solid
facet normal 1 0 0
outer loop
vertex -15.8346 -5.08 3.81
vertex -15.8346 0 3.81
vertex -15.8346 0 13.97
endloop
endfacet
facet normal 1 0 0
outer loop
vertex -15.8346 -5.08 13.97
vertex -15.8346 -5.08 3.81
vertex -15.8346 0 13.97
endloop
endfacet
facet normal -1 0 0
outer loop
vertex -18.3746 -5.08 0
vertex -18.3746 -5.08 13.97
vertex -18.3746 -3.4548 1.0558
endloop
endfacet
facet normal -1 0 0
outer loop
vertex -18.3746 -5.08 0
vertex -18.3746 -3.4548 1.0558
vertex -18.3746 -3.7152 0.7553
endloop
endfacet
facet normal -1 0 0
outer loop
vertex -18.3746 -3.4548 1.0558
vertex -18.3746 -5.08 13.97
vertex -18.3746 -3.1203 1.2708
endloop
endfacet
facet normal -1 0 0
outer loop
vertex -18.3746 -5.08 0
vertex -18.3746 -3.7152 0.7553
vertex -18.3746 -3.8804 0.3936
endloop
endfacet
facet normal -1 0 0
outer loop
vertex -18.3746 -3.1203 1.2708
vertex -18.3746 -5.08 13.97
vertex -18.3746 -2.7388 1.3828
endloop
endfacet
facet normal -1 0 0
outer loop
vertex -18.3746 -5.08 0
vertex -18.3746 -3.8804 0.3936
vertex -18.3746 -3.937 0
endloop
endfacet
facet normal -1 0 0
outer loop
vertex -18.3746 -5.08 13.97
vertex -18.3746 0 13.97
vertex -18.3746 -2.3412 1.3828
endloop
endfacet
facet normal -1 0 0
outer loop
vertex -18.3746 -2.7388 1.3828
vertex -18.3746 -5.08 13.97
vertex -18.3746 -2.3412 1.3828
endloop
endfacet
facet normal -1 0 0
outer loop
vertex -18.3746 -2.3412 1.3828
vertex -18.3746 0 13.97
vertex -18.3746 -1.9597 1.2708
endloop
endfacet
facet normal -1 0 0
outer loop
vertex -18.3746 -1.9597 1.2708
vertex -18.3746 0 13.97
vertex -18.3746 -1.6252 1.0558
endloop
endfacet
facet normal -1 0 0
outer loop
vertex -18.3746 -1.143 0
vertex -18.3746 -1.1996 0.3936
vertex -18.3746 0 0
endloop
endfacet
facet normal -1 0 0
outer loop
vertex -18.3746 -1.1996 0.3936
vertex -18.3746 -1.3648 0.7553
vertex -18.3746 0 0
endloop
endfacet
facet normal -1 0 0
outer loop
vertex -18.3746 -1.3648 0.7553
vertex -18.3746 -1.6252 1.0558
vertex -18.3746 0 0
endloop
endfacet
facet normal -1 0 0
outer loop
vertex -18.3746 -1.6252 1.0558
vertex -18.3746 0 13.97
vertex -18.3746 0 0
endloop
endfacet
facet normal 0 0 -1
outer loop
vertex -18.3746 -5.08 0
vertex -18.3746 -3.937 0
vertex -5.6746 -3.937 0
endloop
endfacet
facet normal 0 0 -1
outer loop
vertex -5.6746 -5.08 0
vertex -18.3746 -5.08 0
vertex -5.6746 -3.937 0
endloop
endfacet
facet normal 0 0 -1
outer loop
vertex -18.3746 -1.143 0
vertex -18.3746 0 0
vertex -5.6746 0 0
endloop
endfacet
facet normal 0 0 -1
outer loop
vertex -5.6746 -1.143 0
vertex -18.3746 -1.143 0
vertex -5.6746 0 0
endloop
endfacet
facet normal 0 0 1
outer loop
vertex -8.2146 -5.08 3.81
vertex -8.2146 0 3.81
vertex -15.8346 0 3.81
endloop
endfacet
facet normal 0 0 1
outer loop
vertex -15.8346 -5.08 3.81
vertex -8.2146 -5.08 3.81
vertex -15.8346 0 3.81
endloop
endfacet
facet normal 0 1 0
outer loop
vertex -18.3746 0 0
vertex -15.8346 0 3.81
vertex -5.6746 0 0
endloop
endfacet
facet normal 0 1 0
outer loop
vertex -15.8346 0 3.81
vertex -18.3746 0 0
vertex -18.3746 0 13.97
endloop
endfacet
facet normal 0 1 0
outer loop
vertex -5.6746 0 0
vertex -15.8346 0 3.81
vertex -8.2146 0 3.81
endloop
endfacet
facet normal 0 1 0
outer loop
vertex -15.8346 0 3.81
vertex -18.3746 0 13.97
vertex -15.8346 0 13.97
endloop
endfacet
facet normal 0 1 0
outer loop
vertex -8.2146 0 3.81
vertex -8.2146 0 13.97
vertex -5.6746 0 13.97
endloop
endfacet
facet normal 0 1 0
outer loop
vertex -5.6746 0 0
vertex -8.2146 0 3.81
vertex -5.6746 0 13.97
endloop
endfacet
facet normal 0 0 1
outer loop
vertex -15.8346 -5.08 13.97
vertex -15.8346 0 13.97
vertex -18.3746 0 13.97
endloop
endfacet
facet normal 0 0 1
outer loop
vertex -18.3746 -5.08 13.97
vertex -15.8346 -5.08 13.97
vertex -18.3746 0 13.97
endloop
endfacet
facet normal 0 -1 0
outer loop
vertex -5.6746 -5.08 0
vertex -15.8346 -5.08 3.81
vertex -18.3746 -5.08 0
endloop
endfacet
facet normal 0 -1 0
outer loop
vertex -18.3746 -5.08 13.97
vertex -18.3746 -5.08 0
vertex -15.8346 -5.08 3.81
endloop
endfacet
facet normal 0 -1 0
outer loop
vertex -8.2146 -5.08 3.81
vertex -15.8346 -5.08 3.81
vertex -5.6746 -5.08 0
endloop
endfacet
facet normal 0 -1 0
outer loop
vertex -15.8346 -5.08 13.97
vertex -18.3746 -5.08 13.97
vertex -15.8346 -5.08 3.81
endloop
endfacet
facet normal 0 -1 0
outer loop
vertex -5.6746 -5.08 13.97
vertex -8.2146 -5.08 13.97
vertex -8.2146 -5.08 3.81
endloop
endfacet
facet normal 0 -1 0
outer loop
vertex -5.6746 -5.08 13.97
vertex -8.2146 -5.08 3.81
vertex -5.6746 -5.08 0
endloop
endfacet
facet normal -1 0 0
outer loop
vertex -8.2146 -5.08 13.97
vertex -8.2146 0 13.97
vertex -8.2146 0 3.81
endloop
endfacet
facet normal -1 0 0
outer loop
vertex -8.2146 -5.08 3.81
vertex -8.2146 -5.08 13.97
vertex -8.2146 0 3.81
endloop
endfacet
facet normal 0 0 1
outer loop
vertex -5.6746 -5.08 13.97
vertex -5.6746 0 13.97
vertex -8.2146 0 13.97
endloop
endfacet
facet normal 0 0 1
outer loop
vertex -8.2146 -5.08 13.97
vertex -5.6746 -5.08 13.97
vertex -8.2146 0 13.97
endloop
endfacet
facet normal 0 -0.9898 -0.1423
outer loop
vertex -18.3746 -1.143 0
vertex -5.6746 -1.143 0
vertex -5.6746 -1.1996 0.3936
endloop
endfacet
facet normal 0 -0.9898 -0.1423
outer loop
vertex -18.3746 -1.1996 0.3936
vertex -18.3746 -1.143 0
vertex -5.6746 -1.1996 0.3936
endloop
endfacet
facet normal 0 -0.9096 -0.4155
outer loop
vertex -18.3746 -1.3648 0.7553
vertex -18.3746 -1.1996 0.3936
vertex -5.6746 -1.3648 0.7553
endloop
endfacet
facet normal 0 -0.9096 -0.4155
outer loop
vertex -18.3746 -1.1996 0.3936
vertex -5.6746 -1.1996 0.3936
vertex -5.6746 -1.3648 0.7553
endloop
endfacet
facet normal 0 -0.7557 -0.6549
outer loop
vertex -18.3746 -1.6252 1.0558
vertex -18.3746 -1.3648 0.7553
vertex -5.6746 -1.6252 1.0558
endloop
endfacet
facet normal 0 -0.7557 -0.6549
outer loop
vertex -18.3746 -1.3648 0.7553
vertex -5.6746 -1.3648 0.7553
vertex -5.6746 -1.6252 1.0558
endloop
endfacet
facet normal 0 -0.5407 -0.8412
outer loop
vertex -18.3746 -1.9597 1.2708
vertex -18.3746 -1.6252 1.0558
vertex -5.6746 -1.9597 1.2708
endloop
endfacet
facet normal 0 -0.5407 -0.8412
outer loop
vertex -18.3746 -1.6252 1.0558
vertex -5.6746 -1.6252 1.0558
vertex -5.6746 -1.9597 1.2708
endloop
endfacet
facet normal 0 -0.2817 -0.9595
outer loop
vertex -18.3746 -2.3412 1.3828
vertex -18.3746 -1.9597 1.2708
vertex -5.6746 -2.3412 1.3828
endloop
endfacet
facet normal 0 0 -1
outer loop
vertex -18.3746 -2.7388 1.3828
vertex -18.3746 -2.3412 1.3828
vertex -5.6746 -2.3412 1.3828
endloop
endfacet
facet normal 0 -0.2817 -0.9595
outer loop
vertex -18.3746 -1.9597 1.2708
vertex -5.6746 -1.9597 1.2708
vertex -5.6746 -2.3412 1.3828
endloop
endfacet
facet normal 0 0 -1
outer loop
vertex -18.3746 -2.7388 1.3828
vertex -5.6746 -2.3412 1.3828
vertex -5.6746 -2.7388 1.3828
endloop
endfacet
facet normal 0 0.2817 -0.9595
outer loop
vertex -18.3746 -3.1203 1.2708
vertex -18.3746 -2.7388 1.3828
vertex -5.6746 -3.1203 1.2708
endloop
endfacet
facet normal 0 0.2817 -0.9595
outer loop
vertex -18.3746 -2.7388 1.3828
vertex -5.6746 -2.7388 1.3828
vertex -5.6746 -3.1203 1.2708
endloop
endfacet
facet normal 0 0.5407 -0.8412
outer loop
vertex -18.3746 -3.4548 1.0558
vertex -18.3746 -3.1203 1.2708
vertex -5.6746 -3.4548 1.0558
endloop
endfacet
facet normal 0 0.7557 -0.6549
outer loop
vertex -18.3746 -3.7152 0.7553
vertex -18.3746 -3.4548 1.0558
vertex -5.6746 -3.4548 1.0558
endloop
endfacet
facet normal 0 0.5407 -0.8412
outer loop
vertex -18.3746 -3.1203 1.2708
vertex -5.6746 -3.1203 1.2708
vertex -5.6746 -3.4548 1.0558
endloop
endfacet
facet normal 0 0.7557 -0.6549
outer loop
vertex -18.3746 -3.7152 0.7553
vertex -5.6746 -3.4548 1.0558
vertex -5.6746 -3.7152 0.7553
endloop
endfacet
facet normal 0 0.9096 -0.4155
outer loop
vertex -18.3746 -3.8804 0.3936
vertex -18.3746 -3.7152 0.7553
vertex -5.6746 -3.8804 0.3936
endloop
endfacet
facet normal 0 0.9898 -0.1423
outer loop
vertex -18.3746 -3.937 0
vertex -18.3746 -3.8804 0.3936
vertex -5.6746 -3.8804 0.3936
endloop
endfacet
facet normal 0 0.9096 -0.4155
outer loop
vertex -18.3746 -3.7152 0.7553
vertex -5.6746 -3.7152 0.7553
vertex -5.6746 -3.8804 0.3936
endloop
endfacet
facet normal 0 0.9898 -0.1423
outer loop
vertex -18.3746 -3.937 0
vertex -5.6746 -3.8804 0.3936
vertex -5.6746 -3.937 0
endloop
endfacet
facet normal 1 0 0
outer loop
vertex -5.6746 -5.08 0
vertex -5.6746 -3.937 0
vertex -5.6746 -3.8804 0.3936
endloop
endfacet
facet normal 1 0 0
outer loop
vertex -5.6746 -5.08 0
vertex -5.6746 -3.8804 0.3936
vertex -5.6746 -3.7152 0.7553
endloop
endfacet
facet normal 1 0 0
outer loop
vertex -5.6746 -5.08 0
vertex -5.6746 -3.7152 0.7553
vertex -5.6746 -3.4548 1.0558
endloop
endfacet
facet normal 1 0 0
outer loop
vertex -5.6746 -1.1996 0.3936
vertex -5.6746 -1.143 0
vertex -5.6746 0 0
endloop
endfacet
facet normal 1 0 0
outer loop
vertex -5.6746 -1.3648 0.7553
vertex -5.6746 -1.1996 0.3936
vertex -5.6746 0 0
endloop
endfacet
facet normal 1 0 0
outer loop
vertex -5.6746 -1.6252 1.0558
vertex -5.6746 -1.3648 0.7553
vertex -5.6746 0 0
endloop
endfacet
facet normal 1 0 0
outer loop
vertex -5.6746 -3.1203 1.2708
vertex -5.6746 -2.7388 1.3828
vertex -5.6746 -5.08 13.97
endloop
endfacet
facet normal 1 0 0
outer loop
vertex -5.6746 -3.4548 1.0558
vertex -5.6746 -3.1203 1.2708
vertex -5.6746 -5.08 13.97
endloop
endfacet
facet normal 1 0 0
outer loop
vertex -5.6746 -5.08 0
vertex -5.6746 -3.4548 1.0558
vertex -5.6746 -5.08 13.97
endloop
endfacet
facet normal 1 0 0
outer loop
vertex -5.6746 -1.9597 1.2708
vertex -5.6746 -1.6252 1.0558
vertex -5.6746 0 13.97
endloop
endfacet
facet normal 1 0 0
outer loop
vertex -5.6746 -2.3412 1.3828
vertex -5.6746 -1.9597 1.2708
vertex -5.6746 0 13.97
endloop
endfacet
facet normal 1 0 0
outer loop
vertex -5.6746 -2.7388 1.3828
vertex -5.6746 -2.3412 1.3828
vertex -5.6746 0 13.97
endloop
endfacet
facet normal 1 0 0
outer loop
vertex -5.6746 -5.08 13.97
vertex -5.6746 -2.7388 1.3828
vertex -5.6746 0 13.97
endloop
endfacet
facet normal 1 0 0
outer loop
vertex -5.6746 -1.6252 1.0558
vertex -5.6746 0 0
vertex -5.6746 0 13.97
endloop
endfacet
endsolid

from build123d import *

# Parameters (mm, degrees)
F1_DEPTH = 5.08
F2_R     = 1.397
F3_DEPTH = 25.4


with BuildPart() as f1:
    # F0 (on Front) → F1 (new body)
    with BuildSketch(Plane.XZ):
        Polygon((-15.834635, 13.97), (-18.374635, 13.97), (-18.374635, 0), (-12.024635, 0), (-12.024635, 3.81), (-15.834635, 3.81), align=None)
        Polygon((-12.024635, 3.81), (-12.024635, 0), (-5.674635, 0), (-5.674635, 13.97), (-8.214635, 13.97), (-8.214635, 3.81), align=None)
    extrude(amount=F1_DEPTH)

    # F2 (on face) → F3 (cut)
    with BuildSketch(Plane.YZ.offset(-5.674635)):
        with Locations((-2.54, 0)):
            Circle(F2_R)
    extrude(amount=-F3_DEPTH, mode=Mode.SUBTRACT)


solid = f1.part
